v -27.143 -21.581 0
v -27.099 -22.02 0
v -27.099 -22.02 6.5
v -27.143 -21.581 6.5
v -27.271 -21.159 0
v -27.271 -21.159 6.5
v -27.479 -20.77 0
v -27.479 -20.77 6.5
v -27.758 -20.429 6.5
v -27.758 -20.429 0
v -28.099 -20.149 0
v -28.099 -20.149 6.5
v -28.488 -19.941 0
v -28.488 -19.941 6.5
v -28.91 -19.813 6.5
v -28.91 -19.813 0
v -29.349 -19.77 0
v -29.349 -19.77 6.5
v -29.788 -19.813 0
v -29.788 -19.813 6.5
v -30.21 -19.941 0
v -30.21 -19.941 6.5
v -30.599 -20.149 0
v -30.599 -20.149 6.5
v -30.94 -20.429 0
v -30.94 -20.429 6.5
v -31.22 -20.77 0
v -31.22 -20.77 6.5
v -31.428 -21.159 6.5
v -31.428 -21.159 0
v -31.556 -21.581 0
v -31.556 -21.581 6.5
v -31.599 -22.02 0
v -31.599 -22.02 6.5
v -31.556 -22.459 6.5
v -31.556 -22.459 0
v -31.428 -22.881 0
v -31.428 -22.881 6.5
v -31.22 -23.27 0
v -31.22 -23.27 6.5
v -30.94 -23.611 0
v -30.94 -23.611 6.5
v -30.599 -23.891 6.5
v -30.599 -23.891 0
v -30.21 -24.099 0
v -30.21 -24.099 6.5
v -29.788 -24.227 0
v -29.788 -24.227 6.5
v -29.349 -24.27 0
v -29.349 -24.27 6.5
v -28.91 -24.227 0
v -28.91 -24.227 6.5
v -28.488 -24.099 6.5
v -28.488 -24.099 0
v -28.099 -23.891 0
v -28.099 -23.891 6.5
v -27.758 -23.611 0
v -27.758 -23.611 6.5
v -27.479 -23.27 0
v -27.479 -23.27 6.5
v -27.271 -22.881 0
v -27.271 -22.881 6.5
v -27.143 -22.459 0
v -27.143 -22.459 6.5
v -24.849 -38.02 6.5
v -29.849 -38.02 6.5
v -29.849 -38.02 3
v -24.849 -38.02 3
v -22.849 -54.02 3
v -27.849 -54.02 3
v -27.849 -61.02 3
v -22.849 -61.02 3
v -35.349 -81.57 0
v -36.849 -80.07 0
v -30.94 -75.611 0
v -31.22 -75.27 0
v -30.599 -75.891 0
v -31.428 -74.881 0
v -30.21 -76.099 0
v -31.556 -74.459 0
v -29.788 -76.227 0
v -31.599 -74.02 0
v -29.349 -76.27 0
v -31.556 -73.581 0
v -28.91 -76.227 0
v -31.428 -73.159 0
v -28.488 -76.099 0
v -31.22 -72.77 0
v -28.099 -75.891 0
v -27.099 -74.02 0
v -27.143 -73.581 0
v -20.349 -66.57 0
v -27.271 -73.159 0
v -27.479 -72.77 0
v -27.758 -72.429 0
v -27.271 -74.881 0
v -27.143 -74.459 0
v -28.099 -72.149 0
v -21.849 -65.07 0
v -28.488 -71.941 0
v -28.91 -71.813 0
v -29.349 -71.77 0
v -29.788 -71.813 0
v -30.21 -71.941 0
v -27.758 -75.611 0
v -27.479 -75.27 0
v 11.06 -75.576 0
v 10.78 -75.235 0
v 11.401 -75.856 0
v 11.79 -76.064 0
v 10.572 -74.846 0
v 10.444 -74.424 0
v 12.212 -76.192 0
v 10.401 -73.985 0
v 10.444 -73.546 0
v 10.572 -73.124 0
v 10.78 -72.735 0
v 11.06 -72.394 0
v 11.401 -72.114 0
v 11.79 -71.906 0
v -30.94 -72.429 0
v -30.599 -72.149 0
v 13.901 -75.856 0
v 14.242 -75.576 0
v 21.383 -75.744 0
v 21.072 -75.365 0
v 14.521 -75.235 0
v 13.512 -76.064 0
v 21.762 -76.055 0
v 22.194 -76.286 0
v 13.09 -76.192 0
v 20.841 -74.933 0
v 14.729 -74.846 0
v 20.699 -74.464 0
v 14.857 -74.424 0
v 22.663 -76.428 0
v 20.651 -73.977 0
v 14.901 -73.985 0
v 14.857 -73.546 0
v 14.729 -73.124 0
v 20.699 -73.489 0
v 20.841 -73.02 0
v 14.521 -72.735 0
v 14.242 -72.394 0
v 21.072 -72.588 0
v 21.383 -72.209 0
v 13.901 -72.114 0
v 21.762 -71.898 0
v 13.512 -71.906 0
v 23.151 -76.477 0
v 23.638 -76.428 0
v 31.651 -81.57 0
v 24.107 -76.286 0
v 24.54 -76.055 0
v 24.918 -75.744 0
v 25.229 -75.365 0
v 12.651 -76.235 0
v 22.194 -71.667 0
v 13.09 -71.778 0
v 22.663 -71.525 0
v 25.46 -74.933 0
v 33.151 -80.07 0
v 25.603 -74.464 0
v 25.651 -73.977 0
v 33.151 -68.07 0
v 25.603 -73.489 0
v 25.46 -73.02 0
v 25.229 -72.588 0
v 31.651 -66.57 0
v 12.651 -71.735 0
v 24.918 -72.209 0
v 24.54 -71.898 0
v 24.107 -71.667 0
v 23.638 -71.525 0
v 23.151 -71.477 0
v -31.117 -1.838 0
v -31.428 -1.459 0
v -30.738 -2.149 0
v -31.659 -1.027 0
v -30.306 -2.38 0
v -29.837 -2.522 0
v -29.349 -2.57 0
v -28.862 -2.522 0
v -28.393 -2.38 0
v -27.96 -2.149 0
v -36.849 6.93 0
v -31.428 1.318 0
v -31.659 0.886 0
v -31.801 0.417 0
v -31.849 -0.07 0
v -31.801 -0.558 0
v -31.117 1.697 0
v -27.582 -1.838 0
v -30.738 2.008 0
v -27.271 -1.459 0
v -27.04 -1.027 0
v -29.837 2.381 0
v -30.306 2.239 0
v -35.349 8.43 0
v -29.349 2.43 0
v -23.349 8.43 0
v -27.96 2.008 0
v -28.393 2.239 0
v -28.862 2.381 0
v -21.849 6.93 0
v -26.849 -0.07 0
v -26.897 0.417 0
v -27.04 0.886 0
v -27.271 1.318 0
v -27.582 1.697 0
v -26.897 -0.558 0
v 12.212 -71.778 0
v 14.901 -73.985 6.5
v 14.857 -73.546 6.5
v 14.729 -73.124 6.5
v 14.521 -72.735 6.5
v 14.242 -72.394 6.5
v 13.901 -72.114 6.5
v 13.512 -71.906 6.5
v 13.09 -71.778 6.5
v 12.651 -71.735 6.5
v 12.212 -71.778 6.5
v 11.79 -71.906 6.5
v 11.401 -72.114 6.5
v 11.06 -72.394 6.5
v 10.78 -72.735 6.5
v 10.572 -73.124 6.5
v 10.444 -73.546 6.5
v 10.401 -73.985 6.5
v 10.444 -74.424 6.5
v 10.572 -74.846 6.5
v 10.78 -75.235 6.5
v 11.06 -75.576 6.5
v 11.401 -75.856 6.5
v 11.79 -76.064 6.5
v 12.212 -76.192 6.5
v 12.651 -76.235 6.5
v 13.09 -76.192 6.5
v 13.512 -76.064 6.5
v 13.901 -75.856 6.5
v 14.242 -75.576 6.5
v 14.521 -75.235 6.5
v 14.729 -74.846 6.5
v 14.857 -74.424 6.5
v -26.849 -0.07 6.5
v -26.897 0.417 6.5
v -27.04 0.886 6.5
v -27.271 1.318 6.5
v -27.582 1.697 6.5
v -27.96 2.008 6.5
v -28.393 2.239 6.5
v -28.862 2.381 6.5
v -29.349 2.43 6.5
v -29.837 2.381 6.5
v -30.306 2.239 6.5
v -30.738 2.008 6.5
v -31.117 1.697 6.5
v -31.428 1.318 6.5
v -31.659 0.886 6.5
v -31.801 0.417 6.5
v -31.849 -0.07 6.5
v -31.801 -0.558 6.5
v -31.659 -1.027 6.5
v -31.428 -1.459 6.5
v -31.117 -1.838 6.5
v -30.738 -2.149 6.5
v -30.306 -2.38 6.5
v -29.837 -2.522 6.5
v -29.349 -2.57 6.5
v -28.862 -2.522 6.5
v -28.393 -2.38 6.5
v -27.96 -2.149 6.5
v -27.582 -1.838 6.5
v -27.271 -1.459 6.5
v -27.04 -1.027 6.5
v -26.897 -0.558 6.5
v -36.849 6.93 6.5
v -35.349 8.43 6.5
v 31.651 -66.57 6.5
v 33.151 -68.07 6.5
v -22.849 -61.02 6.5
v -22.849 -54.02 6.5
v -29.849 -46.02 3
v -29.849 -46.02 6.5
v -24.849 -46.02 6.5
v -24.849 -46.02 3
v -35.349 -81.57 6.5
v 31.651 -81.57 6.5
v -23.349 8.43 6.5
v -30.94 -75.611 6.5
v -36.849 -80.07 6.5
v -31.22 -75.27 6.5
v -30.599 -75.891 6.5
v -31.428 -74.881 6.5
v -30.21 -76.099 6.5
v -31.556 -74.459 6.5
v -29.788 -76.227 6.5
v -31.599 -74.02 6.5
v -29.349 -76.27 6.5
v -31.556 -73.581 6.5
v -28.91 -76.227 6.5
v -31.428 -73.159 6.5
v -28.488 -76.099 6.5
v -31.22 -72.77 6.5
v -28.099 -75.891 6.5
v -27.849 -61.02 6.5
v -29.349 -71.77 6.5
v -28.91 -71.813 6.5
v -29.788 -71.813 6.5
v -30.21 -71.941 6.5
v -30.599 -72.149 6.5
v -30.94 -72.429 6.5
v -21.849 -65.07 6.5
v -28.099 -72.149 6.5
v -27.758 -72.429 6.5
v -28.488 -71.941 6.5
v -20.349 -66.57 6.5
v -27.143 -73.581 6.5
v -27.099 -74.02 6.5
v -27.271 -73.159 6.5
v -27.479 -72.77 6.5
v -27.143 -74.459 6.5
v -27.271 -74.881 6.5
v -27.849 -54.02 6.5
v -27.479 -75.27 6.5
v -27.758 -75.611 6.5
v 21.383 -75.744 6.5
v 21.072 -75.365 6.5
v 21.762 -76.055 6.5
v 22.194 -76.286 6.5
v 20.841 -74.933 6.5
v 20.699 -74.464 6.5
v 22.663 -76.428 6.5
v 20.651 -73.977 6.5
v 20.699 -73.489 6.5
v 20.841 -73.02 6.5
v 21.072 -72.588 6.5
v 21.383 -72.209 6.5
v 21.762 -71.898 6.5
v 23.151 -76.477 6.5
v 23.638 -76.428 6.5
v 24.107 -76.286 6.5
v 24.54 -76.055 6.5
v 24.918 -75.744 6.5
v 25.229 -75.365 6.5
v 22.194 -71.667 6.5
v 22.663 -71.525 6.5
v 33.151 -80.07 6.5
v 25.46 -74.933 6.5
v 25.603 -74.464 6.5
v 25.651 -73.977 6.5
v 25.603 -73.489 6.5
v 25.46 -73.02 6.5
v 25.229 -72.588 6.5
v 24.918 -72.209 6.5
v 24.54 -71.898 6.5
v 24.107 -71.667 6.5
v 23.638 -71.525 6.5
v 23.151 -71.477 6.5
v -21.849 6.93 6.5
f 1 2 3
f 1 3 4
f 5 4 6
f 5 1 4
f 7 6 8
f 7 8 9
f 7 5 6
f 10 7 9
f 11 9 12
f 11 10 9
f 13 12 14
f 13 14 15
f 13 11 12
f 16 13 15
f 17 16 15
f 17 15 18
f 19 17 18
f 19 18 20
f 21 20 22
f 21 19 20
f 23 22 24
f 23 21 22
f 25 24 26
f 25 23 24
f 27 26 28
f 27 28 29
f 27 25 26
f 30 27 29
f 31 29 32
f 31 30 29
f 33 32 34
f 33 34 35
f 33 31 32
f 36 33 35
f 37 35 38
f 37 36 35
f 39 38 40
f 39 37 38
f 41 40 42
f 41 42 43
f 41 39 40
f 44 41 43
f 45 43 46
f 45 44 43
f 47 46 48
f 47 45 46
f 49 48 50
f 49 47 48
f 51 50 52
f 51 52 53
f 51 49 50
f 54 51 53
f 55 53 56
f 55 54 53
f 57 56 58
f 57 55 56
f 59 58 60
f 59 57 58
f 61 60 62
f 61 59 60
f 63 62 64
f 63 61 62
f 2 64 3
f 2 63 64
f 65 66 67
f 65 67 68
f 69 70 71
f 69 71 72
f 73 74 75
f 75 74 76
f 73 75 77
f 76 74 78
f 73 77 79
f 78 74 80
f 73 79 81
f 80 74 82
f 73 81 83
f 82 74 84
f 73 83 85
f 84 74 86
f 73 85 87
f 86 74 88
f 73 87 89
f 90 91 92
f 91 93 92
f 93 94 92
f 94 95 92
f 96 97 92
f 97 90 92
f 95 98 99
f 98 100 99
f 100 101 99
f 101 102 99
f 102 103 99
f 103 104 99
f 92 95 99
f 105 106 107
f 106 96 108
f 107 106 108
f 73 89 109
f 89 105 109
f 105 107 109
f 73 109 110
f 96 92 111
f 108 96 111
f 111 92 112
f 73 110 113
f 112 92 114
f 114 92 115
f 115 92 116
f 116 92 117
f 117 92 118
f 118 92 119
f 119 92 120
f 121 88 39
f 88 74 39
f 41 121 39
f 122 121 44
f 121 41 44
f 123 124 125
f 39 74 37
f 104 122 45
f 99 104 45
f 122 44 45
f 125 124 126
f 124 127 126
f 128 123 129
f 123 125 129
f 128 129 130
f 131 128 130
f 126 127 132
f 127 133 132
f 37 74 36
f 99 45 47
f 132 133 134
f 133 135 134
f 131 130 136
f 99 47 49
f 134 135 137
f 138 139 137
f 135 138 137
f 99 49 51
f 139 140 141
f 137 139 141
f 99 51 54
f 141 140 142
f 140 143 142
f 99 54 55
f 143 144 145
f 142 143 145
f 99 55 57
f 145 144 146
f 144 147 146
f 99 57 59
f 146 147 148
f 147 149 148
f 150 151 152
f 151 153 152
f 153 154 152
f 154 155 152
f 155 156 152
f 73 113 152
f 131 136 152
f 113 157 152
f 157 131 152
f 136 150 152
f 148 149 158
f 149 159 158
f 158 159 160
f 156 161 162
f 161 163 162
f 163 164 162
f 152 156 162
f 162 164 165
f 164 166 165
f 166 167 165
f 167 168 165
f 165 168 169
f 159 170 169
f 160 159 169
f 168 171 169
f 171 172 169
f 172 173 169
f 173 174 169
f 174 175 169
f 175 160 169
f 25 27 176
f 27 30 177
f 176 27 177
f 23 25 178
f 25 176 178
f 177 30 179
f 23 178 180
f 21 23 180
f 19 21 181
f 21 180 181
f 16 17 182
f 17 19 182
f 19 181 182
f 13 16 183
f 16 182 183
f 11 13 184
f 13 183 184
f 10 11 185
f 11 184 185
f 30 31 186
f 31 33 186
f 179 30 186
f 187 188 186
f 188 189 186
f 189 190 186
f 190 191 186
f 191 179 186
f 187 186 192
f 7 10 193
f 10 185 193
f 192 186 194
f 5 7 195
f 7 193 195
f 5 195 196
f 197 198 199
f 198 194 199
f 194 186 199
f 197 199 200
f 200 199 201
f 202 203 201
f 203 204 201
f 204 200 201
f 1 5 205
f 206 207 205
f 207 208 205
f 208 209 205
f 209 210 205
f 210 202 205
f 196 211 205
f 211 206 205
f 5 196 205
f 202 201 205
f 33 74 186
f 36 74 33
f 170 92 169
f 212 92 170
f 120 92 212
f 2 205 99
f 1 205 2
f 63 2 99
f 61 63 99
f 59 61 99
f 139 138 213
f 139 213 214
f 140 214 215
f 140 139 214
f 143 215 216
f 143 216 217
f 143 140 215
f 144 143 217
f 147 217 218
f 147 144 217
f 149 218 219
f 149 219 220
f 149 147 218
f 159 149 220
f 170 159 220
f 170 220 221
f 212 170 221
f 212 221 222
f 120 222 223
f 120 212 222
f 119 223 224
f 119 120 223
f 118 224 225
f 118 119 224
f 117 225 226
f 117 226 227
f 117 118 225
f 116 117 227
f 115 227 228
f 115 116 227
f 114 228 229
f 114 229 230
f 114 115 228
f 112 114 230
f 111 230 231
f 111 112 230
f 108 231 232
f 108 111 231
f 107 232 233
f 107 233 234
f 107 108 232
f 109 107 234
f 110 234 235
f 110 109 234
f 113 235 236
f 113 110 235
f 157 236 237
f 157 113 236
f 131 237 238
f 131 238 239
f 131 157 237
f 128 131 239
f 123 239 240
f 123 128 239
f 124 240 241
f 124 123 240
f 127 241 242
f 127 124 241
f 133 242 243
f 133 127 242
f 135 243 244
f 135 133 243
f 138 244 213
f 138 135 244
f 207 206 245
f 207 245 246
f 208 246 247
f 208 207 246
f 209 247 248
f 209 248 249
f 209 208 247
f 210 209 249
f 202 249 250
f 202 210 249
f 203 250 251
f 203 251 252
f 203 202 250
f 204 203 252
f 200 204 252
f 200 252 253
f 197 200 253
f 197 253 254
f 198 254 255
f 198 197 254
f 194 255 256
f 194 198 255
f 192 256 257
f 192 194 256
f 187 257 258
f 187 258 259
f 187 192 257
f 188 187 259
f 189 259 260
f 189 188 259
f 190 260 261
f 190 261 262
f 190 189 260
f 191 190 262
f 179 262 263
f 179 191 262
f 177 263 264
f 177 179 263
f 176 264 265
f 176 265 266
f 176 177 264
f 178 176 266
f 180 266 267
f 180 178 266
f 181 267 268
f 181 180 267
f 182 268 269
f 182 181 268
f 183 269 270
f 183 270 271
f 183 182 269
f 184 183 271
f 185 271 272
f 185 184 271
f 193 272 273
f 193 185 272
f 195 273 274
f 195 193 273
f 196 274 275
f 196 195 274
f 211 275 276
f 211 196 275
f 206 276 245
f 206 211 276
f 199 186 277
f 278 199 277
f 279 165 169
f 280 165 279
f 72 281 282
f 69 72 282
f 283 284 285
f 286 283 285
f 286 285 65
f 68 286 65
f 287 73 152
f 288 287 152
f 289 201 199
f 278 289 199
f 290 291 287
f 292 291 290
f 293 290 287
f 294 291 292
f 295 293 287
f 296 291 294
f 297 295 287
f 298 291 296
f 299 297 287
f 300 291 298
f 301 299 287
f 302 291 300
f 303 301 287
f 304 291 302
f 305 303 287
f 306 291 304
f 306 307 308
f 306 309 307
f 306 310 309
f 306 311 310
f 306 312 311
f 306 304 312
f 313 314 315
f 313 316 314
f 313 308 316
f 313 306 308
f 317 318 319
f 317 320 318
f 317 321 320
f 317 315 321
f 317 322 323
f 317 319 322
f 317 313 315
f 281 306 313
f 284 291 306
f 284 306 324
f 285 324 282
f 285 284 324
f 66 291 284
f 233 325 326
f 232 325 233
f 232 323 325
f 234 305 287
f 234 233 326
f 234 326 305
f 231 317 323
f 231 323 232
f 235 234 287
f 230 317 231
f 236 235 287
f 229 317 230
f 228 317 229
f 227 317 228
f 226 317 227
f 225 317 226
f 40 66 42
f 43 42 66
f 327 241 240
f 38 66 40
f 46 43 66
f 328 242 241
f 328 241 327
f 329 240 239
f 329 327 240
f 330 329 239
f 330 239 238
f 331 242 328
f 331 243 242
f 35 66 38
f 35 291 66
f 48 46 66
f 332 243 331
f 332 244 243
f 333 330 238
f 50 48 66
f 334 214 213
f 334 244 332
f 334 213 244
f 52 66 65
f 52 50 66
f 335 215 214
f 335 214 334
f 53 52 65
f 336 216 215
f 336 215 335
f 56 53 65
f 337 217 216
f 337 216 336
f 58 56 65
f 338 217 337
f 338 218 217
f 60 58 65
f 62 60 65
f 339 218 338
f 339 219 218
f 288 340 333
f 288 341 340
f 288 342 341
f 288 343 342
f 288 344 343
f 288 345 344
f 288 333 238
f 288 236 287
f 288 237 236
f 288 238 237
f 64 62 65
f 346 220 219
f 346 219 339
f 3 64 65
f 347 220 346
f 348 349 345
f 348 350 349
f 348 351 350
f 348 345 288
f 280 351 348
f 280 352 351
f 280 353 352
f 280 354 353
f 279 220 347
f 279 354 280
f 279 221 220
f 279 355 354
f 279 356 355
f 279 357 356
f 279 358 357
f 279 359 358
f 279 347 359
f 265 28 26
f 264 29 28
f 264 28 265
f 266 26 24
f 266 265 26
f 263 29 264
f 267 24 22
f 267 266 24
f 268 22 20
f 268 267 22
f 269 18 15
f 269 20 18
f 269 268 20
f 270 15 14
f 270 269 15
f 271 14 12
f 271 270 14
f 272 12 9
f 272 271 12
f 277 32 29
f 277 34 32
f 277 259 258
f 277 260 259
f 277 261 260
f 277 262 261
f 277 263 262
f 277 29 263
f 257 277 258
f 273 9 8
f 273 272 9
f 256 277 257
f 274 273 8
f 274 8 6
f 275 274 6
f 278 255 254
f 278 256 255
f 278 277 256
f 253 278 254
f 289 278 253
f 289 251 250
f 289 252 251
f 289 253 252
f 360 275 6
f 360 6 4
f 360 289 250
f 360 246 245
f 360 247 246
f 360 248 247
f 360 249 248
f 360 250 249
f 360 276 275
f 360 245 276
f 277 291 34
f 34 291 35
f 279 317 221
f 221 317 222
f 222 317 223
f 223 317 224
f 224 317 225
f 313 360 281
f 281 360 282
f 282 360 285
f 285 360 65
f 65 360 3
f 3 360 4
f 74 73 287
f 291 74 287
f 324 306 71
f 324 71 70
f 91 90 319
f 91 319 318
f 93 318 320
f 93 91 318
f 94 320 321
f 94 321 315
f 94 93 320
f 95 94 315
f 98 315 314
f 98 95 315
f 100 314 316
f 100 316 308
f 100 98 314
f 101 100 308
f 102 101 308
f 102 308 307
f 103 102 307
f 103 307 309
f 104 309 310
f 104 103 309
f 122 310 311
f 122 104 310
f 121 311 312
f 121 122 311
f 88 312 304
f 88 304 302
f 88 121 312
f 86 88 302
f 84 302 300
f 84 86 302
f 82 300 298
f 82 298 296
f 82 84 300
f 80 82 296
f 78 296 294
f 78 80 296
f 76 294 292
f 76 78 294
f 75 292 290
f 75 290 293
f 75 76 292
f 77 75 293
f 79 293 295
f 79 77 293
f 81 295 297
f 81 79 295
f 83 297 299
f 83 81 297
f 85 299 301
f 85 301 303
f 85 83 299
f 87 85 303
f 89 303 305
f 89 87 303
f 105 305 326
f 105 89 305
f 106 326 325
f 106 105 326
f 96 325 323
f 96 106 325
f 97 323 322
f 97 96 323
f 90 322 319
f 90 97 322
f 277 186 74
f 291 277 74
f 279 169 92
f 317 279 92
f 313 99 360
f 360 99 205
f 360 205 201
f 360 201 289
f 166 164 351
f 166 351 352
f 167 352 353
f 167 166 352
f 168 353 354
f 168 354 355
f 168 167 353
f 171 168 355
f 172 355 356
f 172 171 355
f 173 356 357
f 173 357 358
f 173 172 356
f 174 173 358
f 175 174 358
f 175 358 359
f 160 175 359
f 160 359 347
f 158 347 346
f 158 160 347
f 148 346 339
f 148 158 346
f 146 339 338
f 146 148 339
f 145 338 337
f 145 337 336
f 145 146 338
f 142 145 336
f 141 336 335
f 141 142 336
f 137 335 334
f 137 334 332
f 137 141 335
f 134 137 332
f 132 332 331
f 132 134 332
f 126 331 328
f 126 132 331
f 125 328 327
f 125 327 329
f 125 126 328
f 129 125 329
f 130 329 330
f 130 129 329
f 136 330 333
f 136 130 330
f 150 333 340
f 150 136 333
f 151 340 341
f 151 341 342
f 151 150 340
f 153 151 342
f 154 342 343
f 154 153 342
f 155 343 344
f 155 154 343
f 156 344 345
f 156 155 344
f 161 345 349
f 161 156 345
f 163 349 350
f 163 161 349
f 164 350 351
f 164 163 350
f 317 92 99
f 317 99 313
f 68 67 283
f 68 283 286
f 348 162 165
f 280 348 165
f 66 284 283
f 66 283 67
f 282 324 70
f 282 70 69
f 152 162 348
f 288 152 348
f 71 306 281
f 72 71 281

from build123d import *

# Parameters (mm, degrees)
F0_R     = 2.25
F0_R_2   = 2.5
F1_DEPTH = 6.5
F2_SIZE  = 1.5
F3_W     = 5
F3_H     = 8
F3_H_2   = 7
F4_DEPTH = 3.5


with BuildPart() as f1:
    # F0 (on Top) → F1 (new body)
    with BuildSketch(Plane.XY):
        Polygon((-21.849313, 8.429525), (-36.849313, 8.429525), (-36.849313, -81.570475), (33.150687, -81.570475), (33.150687, -66.570475), (23.150687, -66.570475), (-21.849313, -66.570475), align=None)
        with Locations((-29.349313, -74.020133)):
            Circle(F0_R, mode=Mode.SUBTRACT)
        with Locations((12.650687, -73.985228)):
            Circle(F0_R, mode=Mode.SUBTRACT)
        with Locations((23.150687, -73.976502)):
            Circle(F0_R_2, mode=Mode.SUBTRACT)
        with Locations((-29.349313, -22.020115)):
            Circle(F0_R, mode=Mode.SUBTRACT)
        with Locations((-29.349313, -0.070475)):
            Circle(F0_R_2, mode=Mode.SUBTRACT)
    extrude(amount=F1_DEPTH)

    # F2
    f2_edges = [f1.edges().sort_by_distance(p)[0] for p in [
        (-21.849313, 8.429525, 3.25),
        (-36.849313, 8.429525, 3.25),
        (-36.849313, -81.570475, 3.25),
        (-21.849313, -66.570475, 3.25),
        (33.150687, -66.570475, 3.25),
        (33.150687, -81.570475, 3.25),
    ]]
    chamfer(f2_edges, length=F2_SIZE)

    # F3 (on face) → F4 (cut)
    with BuildSketch(Plane.XY.offset(6.5)):
        with Locations((-27.349313, -42.020133)):
            Rectangle(F3_W, F3_H)
        with Locations((-25.349313, -57.520133)):
            Rectangle(F3_W, F3_H_2)
    extrude(amount=-F4_DEPTH, mode=Mode.SUBTRACT)


solid = f1.part
